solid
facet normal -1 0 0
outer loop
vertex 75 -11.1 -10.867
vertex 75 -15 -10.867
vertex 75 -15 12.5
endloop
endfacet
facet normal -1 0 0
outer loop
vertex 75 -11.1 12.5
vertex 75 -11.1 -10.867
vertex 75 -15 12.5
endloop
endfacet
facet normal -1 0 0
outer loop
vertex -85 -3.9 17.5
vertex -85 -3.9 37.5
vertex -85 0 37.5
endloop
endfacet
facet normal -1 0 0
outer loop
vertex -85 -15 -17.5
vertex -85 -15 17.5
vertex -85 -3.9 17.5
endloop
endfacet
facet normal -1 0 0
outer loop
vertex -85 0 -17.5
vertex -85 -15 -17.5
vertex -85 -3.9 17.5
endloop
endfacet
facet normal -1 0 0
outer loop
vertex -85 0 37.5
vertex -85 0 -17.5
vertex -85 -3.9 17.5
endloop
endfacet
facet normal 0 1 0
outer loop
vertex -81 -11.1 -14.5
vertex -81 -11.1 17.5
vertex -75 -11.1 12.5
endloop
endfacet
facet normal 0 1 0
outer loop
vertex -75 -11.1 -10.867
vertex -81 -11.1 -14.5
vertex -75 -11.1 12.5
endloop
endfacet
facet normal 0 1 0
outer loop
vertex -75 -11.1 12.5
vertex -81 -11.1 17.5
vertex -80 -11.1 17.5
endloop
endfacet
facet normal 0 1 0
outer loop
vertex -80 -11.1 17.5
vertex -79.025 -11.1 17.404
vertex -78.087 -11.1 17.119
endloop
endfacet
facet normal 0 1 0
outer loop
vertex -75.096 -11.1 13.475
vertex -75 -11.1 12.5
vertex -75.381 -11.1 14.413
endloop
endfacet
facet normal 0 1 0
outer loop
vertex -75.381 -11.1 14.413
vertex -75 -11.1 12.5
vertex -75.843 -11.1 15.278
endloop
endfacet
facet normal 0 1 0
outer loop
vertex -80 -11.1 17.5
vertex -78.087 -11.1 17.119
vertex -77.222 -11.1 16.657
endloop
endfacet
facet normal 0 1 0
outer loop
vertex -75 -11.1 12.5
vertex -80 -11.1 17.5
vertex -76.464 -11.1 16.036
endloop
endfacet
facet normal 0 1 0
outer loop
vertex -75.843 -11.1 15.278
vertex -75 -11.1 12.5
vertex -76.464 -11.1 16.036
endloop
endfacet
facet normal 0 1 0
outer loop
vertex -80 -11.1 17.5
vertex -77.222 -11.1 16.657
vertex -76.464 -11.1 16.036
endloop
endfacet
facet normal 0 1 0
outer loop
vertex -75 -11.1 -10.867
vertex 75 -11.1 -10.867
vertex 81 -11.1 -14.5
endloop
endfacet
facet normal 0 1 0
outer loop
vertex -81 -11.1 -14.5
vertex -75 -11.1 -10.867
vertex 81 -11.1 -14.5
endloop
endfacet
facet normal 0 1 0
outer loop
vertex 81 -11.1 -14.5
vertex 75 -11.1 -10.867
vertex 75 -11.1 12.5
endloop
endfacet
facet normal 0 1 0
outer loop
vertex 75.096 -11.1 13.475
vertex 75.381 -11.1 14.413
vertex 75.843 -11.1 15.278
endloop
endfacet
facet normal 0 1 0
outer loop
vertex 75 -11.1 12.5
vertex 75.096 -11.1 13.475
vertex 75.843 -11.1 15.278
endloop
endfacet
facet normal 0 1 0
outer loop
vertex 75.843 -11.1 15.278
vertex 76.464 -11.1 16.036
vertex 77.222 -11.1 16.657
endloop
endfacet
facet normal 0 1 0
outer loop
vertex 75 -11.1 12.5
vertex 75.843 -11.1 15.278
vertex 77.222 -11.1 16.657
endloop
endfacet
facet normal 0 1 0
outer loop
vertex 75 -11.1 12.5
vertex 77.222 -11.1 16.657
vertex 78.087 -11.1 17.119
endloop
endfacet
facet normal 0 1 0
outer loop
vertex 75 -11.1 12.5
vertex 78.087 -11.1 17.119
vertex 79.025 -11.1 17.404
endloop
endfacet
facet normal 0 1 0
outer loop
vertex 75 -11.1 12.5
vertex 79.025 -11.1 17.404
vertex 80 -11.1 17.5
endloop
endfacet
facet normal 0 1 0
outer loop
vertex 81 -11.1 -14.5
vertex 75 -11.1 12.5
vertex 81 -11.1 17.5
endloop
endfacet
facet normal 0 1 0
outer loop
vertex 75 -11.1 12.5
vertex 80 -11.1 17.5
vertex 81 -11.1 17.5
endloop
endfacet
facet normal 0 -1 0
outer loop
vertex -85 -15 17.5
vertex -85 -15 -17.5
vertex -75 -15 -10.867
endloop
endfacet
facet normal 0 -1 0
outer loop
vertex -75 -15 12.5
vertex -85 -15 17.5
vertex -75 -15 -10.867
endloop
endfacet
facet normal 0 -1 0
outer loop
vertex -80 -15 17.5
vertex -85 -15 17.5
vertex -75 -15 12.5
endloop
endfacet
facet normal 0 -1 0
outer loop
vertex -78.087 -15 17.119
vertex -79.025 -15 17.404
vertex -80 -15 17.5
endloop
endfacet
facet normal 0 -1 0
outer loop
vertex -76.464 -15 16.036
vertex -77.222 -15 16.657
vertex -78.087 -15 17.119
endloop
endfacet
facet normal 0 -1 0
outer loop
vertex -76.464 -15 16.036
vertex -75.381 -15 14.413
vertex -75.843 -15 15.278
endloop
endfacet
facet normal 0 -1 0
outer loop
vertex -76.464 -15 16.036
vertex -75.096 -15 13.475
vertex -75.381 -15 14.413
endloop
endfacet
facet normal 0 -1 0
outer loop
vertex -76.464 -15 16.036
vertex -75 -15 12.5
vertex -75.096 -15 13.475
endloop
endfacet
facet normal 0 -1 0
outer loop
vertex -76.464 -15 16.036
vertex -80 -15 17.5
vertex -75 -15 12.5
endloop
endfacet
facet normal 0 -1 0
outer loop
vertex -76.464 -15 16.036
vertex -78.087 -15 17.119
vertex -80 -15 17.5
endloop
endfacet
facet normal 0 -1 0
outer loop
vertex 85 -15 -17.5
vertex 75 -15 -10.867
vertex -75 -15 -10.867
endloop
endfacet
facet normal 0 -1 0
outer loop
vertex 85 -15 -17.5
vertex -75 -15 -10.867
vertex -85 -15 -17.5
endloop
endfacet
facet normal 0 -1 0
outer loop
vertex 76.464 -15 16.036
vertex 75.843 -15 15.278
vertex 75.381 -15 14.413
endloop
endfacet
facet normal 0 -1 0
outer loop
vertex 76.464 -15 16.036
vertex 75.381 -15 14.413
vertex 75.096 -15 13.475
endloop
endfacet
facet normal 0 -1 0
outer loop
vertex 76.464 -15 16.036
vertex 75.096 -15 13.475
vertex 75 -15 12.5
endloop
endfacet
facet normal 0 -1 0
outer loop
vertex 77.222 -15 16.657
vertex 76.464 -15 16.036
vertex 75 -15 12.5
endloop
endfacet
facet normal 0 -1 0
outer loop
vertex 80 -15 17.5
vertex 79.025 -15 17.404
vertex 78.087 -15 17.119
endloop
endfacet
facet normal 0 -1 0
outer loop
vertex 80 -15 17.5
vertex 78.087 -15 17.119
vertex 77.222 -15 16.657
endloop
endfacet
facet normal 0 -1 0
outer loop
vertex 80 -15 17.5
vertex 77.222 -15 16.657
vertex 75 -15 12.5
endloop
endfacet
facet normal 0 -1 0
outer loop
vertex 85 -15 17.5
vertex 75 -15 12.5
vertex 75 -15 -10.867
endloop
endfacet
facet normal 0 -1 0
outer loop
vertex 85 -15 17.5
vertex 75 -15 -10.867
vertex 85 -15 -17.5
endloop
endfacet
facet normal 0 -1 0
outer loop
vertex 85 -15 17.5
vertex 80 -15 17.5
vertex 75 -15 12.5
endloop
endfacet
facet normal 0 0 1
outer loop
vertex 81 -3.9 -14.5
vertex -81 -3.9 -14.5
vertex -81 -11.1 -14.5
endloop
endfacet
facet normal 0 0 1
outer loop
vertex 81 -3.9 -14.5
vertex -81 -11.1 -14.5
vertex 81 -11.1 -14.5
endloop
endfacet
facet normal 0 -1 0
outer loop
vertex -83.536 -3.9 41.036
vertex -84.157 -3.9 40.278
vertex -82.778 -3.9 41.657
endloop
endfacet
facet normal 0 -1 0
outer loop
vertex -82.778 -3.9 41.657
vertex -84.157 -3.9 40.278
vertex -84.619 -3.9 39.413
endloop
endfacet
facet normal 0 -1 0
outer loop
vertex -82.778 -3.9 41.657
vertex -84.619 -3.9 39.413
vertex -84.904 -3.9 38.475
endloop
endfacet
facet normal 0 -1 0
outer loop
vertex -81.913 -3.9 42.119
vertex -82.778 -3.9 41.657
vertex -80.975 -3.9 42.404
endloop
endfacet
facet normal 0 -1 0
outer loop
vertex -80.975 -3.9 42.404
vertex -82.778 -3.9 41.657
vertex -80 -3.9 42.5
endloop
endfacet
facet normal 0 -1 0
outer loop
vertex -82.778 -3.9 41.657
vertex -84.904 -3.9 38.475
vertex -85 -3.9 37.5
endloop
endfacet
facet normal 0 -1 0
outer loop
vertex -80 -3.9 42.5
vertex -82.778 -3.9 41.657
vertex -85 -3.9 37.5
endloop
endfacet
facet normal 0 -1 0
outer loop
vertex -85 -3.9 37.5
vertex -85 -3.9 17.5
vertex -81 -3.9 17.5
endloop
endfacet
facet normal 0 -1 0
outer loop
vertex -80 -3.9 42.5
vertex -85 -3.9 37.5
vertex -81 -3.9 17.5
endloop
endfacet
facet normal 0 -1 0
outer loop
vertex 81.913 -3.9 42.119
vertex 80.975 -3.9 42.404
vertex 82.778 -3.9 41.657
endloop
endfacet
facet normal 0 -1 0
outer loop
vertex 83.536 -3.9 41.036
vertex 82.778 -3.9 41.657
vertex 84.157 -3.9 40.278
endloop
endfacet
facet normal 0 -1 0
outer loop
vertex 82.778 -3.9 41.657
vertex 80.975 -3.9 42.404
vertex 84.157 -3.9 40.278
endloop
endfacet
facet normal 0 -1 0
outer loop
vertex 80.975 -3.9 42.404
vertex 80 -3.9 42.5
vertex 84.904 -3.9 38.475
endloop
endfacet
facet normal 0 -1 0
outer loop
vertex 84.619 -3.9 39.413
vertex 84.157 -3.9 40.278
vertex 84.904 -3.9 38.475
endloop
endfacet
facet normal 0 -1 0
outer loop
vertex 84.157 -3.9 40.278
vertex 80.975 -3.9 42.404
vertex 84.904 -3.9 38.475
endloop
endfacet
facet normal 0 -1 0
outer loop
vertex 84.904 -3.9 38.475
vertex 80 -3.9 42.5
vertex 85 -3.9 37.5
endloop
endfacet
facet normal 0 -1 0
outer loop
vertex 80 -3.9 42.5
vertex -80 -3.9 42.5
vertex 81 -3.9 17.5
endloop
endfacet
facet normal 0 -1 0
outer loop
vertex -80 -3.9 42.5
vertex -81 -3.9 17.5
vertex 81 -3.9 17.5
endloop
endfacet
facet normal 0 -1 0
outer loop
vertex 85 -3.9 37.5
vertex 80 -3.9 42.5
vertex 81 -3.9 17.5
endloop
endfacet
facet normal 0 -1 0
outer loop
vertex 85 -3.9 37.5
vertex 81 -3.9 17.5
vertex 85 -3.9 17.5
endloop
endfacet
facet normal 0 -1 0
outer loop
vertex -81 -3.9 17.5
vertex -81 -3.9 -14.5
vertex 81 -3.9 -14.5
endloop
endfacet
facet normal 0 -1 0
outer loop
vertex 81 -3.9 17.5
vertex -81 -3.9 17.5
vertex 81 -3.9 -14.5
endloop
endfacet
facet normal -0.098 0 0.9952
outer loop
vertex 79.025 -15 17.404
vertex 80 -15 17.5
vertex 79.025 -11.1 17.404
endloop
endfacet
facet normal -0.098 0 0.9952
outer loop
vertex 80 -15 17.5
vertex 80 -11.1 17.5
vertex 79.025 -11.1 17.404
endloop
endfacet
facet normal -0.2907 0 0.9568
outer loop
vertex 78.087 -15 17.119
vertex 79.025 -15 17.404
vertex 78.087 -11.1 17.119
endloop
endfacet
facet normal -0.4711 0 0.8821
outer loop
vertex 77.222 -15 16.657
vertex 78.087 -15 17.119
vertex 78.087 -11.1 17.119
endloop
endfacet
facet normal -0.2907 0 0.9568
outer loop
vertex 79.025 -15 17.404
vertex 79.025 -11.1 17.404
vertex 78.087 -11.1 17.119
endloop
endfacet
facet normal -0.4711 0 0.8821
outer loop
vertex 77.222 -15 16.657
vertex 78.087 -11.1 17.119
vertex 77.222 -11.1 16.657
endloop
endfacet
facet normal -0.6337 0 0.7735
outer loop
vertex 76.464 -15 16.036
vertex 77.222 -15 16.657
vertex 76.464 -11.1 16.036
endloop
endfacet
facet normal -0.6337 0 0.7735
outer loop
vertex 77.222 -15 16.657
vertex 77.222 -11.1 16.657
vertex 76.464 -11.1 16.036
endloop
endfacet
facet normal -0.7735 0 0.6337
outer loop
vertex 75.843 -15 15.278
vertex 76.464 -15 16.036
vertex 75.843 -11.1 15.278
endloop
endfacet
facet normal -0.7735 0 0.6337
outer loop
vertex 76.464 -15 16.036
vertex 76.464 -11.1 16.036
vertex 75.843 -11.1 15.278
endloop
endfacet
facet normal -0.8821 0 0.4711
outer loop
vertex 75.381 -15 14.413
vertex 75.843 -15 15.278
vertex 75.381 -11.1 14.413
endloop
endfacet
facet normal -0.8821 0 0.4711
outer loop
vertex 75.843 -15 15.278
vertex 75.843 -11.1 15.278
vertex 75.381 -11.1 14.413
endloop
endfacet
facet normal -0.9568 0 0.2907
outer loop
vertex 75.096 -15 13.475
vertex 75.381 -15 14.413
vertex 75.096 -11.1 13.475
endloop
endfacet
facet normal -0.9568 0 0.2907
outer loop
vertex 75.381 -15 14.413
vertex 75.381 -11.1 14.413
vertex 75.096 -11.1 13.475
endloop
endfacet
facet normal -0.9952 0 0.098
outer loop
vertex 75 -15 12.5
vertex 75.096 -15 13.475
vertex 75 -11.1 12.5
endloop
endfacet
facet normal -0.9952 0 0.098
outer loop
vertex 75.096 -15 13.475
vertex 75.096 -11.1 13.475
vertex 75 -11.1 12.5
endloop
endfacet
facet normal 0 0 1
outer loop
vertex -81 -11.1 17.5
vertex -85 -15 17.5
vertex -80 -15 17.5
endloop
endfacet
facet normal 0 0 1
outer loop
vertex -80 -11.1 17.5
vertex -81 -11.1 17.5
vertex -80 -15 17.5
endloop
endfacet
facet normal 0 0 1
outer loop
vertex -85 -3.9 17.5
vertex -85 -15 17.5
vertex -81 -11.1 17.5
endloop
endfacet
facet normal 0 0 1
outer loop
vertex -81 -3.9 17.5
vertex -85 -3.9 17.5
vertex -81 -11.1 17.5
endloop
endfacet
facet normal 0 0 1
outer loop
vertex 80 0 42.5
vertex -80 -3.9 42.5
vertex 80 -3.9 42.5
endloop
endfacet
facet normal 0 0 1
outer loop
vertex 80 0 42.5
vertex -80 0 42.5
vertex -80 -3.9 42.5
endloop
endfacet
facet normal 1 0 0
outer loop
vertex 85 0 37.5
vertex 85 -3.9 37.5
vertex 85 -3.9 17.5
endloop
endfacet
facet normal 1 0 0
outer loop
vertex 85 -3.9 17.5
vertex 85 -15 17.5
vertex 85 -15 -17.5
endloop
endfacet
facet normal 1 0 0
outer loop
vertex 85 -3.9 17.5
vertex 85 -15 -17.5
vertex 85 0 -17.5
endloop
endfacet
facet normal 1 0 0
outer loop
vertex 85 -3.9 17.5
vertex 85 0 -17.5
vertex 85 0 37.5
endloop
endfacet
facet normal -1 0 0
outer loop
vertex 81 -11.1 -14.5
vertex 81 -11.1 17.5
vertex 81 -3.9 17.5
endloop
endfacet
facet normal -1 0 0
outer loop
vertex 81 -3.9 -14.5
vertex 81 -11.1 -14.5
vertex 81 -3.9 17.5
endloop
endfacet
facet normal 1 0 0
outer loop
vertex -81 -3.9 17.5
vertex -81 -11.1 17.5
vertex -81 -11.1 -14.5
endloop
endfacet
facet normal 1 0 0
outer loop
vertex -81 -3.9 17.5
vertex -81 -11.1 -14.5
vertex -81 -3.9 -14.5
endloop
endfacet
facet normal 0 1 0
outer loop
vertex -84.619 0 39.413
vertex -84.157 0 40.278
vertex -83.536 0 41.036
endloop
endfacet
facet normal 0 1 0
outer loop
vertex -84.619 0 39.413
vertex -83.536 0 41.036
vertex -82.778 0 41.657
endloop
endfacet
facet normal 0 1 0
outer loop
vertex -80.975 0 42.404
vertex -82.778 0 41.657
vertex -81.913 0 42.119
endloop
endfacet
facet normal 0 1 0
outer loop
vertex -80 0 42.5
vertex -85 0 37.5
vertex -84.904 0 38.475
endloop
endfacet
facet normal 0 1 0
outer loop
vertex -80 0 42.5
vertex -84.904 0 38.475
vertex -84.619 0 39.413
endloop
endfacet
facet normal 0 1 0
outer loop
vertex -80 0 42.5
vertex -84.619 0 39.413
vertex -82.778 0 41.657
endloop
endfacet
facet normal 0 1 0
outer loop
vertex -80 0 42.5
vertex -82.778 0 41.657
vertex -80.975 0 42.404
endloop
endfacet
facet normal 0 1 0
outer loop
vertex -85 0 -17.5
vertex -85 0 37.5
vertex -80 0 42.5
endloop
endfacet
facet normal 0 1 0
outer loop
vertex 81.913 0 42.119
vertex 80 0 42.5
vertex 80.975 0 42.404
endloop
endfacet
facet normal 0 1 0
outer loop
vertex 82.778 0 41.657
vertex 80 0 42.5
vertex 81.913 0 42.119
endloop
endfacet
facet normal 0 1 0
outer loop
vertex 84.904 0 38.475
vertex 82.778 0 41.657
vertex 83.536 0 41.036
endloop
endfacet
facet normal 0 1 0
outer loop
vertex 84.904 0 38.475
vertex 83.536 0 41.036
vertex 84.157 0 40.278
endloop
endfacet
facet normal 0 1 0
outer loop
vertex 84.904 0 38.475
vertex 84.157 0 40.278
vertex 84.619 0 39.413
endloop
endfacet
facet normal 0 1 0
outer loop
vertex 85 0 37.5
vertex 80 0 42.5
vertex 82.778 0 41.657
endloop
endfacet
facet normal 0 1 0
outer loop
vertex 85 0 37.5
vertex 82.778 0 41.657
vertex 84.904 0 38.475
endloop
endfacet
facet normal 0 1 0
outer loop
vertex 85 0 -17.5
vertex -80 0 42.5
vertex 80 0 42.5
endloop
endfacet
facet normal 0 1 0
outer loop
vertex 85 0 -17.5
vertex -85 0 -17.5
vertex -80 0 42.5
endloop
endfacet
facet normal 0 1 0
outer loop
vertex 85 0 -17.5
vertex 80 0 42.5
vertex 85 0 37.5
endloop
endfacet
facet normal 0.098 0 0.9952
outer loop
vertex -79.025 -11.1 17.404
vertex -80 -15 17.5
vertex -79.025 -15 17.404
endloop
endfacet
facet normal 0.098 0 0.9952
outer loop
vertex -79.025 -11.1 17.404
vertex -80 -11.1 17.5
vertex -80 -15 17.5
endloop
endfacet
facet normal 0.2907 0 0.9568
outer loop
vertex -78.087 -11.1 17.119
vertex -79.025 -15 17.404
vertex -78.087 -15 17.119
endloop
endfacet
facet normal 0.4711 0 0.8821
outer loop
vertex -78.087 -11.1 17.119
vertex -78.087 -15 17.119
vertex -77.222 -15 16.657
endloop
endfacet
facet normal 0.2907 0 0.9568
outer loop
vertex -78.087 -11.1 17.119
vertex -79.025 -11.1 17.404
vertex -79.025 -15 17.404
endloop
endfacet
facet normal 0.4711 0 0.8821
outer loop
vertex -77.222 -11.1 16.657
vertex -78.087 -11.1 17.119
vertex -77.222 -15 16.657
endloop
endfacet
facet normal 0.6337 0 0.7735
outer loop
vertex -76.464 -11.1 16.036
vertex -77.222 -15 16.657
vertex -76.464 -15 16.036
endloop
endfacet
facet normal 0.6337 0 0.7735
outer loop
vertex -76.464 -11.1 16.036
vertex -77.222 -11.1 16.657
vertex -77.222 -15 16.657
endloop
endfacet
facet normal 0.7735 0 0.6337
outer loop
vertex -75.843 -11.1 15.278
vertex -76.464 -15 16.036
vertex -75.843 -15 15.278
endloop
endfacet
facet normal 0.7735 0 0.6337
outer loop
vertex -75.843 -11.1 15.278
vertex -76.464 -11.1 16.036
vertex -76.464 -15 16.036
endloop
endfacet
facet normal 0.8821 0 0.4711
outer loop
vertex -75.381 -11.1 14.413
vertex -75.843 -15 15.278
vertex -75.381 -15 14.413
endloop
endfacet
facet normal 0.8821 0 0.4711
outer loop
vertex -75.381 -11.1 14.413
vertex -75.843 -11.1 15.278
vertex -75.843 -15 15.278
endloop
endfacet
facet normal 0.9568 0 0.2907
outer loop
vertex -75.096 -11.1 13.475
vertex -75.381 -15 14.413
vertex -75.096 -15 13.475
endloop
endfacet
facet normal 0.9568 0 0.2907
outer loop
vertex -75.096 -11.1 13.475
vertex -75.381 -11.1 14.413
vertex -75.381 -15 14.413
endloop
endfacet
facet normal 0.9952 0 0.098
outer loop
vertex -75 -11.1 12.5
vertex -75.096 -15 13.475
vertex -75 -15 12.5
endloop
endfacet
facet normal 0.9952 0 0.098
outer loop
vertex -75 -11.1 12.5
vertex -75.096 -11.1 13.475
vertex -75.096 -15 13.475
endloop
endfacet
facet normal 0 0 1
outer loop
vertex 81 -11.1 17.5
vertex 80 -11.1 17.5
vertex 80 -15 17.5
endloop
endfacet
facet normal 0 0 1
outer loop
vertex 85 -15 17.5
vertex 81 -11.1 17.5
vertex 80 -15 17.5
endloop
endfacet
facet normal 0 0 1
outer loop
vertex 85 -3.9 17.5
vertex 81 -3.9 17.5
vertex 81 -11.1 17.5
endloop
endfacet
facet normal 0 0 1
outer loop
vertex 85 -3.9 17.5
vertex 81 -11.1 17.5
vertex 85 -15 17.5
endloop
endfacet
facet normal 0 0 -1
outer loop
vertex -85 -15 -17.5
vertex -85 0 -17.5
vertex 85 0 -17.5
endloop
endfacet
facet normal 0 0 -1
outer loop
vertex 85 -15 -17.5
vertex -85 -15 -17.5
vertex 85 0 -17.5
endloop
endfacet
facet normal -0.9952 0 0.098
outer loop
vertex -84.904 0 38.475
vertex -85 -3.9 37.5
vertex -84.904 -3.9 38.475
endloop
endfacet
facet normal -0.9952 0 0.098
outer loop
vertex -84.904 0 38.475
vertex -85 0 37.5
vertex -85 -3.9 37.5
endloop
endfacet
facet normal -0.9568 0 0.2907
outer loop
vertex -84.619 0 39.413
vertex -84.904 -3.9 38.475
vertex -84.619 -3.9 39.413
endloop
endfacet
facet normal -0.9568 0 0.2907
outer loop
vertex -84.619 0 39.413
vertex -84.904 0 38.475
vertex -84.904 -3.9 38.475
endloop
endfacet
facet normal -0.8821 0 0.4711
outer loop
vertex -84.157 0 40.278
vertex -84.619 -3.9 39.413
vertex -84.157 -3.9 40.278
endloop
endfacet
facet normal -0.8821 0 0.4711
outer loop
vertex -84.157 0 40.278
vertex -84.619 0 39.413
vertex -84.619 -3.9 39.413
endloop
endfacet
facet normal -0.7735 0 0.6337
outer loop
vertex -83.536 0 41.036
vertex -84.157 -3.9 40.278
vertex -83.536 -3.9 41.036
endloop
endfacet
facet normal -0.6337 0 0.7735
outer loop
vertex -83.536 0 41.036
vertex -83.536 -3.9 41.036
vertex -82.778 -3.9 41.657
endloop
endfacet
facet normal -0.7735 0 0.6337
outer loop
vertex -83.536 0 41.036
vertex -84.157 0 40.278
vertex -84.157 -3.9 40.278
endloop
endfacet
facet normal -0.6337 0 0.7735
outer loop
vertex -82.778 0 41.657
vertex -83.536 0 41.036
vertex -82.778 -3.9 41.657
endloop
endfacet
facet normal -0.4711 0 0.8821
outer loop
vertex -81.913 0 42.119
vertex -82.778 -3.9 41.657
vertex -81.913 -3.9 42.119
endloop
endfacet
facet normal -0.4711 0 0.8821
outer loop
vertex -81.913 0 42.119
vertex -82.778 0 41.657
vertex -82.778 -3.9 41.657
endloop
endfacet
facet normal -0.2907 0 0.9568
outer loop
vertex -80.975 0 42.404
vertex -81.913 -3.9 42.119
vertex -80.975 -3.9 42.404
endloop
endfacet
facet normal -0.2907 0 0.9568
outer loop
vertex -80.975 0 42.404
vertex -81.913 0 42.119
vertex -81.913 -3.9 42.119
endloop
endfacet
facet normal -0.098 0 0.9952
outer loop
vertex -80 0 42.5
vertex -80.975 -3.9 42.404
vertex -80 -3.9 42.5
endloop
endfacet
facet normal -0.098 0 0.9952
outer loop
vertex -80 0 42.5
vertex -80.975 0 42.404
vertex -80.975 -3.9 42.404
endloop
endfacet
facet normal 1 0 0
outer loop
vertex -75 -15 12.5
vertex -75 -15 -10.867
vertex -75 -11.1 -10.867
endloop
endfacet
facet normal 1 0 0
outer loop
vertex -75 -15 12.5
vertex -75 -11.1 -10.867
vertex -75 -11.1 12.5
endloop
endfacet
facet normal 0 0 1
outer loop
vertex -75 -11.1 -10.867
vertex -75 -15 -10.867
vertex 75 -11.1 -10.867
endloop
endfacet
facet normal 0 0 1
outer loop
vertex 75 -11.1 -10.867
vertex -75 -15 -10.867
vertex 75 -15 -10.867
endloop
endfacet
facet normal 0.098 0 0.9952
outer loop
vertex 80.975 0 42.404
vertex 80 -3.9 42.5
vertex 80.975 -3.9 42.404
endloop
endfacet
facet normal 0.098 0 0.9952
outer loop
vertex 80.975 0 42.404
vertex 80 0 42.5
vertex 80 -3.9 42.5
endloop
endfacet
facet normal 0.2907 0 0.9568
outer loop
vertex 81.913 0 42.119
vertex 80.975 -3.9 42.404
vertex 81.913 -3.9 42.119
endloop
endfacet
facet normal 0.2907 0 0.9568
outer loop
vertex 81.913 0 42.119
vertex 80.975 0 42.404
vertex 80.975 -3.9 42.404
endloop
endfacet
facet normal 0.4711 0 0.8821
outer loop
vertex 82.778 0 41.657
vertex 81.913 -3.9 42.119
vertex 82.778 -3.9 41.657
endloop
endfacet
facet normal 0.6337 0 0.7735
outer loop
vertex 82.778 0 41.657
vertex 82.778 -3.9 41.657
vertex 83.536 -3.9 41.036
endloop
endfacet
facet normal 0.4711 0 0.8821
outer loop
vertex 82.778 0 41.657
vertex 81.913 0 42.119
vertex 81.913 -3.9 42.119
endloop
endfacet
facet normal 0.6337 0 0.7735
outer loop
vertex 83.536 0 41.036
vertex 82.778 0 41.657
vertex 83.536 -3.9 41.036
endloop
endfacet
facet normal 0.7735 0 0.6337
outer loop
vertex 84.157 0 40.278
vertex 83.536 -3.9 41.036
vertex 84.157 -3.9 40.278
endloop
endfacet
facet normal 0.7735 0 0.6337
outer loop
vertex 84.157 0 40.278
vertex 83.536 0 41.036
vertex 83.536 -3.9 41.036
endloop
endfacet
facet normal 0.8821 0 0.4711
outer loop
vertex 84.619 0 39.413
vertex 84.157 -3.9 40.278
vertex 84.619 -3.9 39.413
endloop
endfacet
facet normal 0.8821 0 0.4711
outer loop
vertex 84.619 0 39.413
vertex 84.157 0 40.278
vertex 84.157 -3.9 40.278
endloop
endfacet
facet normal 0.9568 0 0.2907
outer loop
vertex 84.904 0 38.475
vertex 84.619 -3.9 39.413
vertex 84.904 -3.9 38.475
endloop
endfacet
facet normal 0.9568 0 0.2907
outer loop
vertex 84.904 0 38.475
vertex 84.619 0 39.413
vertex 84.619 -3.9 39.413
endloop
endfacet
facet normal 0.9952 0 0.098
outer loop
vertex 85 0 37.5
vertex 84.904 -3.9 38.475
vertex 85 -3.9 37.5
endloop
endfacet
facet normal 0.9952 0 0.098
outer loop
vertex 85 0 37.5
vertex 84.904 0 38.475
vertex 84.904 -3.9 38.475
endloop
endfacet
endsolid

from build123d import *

# Parameters (mm, degrees)
F0_W     = 170
F0_H     = 35
F1_DEPTH = 15
F2_W     = 162
F2_H     = 7.2
F3_DEPTH = 32
F4_W     = 170
F4_H     = 3.9
F5_DEPTH = 25
F6_W     = 150
F6_H     = 28.3669353649
F7_DEPTH = 6.3
F8_R     = 5


with BuildPart() as f1:
    # F0 (on Front) → F1 (new body)
    with BuildSketch(Plane.XZ):
        Rectangle(F0_W, F0_H)
    extrude(amount=F1_DEPTH)

    # F2 (on face) → F3 (cut)
    with BuildSketch(Plane.XY.offset(17.5)):
        with Locations((0, -7.5)):
            Rectangle(F2_W, F2_H)
    extrude(amount=-F3_DEPTH, mode=Mode.SUBTRACT)

    # F4 (on face) → F5 (join)
    with BuildSketch(Plane.XY.offset(17.5)):
        with Locations((0, -1.95)):
            Rectangle(F4_W, F4_H)
    extrude(amount=F5_DEPTH)

    # F6 (on face) → F7 (cut)
    with BuildSketch(Plane.XZ.offset(15)):
        with Locations((0, 3.3165323175)):
            Rectangle(F6_W, F6_H)
    extrude(amount=-F7_DEPTH, mode=Mode.SUBTRACT)

    # F8
    f8_edges = [f1.edges().sort_by_distance(p)[0] for p in [
        (-85, -1.95, 42.5),
        (85, -1.95, 42.5),
        (75, -13.05, 17.5),
        (-75, -13.05, 17.5),
    ]]
    fillet(f8_edges, radius=F8_R)


solid = f1.part
